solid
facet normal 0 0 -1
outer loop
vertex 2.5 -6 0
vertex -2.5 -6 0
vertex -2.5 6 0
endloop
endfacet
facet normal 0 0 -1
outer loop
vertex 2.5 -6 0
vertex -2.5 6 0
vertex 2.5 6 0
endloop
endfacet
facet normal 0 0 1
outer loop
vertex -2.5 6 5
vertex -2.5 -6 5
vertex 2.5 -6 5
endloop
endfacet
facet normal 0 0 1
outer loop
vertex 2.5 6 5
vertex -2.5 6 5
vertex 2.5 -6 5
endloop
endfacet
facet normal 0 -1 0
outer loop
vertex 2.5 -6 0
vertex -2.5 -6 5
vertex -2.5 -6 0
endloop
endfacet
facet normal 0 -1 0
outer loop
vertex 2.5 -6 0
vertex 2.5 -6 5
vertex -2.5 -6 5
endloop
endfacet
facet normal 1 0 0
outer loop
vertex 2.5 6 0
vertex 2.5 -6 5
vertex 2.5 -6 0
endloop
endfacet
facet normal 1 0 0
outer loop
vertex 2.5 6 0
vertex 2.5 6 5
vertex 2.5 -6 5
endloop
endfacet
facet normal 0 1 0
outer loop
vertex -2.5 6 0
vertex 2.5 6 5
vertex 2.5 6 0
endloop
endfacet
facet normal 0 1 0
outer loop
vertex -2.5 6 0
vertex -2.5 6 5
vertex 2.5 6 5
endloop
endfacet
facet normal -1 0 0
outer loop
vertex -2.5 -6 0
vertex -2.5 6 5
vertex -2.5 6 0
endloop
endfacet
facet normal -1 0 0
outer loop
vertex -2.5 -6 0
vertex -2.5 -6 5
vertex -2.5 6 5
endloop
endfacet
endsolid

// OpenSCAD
// file: varicap.scad
washer_r = 5;
bolt_r = 2;

num_plates = 11;
num_stators = floor(num_plates/2);
num_rotors = ceil(num_plates/2);

thickness = 2;
gap = 5;
fit_gap = 0.5;
slip_gap = 1;
handle_length = 25;
fixing_plate_size = 25;

leg_length = 10;

capacitance = 400; // pF

//TODO: account for space missing in the centre of the plates
r = sqrt((2*gap*capacitance) / ((num_plates-1)*0.2248*3.14));

module semicircle () {
    difference() {
        circle(r);
        circle(washer_r-fit_gap);
        translate([r,0,0]) {
            square(2*r, true);
        }
    }
}

module washer() {
    difference() {
        circle(washer_r);
        circle(bolt_r);
    }
}

module spacer(end) {
    
    washer_len = thickness + gap - slip_gap/2;
    bearing_len = end ? thickness*2 + gap + slip_gap/2 : thickness+gap;
    
    difference () {
        union () {
            if (end) {
                linear_extrude (washer_len) {
                    circle (washer_r * 1.5);
                }
            }
            linear_extrude (bearing_len) {
                circle (washer_r);
            }
            translate ([0,0,bearing_len - fit_gap]) {
                linear_extrude(thickness+fit_gap) {
                    square (washer_r, true);
                }
            }
        }
        
        translate ([0,0,-fit_gap]) {
            linear_extrude (thickness + fit_gap*2) {
                square (washer_r+fit_gap, true);
            }
        }
    }
}

triangle_height = sqrt((r+washer_r)*(r+washer_r)/2);
echo ("triangle height = ", triangle_height);
// main file
include <varicap.scad>;

module spigot () {
    linear_extrude (washer_r) {
        square ([washer_r, thickness*3 + gap + slip_gap], true);
    }
}

spigot ();
